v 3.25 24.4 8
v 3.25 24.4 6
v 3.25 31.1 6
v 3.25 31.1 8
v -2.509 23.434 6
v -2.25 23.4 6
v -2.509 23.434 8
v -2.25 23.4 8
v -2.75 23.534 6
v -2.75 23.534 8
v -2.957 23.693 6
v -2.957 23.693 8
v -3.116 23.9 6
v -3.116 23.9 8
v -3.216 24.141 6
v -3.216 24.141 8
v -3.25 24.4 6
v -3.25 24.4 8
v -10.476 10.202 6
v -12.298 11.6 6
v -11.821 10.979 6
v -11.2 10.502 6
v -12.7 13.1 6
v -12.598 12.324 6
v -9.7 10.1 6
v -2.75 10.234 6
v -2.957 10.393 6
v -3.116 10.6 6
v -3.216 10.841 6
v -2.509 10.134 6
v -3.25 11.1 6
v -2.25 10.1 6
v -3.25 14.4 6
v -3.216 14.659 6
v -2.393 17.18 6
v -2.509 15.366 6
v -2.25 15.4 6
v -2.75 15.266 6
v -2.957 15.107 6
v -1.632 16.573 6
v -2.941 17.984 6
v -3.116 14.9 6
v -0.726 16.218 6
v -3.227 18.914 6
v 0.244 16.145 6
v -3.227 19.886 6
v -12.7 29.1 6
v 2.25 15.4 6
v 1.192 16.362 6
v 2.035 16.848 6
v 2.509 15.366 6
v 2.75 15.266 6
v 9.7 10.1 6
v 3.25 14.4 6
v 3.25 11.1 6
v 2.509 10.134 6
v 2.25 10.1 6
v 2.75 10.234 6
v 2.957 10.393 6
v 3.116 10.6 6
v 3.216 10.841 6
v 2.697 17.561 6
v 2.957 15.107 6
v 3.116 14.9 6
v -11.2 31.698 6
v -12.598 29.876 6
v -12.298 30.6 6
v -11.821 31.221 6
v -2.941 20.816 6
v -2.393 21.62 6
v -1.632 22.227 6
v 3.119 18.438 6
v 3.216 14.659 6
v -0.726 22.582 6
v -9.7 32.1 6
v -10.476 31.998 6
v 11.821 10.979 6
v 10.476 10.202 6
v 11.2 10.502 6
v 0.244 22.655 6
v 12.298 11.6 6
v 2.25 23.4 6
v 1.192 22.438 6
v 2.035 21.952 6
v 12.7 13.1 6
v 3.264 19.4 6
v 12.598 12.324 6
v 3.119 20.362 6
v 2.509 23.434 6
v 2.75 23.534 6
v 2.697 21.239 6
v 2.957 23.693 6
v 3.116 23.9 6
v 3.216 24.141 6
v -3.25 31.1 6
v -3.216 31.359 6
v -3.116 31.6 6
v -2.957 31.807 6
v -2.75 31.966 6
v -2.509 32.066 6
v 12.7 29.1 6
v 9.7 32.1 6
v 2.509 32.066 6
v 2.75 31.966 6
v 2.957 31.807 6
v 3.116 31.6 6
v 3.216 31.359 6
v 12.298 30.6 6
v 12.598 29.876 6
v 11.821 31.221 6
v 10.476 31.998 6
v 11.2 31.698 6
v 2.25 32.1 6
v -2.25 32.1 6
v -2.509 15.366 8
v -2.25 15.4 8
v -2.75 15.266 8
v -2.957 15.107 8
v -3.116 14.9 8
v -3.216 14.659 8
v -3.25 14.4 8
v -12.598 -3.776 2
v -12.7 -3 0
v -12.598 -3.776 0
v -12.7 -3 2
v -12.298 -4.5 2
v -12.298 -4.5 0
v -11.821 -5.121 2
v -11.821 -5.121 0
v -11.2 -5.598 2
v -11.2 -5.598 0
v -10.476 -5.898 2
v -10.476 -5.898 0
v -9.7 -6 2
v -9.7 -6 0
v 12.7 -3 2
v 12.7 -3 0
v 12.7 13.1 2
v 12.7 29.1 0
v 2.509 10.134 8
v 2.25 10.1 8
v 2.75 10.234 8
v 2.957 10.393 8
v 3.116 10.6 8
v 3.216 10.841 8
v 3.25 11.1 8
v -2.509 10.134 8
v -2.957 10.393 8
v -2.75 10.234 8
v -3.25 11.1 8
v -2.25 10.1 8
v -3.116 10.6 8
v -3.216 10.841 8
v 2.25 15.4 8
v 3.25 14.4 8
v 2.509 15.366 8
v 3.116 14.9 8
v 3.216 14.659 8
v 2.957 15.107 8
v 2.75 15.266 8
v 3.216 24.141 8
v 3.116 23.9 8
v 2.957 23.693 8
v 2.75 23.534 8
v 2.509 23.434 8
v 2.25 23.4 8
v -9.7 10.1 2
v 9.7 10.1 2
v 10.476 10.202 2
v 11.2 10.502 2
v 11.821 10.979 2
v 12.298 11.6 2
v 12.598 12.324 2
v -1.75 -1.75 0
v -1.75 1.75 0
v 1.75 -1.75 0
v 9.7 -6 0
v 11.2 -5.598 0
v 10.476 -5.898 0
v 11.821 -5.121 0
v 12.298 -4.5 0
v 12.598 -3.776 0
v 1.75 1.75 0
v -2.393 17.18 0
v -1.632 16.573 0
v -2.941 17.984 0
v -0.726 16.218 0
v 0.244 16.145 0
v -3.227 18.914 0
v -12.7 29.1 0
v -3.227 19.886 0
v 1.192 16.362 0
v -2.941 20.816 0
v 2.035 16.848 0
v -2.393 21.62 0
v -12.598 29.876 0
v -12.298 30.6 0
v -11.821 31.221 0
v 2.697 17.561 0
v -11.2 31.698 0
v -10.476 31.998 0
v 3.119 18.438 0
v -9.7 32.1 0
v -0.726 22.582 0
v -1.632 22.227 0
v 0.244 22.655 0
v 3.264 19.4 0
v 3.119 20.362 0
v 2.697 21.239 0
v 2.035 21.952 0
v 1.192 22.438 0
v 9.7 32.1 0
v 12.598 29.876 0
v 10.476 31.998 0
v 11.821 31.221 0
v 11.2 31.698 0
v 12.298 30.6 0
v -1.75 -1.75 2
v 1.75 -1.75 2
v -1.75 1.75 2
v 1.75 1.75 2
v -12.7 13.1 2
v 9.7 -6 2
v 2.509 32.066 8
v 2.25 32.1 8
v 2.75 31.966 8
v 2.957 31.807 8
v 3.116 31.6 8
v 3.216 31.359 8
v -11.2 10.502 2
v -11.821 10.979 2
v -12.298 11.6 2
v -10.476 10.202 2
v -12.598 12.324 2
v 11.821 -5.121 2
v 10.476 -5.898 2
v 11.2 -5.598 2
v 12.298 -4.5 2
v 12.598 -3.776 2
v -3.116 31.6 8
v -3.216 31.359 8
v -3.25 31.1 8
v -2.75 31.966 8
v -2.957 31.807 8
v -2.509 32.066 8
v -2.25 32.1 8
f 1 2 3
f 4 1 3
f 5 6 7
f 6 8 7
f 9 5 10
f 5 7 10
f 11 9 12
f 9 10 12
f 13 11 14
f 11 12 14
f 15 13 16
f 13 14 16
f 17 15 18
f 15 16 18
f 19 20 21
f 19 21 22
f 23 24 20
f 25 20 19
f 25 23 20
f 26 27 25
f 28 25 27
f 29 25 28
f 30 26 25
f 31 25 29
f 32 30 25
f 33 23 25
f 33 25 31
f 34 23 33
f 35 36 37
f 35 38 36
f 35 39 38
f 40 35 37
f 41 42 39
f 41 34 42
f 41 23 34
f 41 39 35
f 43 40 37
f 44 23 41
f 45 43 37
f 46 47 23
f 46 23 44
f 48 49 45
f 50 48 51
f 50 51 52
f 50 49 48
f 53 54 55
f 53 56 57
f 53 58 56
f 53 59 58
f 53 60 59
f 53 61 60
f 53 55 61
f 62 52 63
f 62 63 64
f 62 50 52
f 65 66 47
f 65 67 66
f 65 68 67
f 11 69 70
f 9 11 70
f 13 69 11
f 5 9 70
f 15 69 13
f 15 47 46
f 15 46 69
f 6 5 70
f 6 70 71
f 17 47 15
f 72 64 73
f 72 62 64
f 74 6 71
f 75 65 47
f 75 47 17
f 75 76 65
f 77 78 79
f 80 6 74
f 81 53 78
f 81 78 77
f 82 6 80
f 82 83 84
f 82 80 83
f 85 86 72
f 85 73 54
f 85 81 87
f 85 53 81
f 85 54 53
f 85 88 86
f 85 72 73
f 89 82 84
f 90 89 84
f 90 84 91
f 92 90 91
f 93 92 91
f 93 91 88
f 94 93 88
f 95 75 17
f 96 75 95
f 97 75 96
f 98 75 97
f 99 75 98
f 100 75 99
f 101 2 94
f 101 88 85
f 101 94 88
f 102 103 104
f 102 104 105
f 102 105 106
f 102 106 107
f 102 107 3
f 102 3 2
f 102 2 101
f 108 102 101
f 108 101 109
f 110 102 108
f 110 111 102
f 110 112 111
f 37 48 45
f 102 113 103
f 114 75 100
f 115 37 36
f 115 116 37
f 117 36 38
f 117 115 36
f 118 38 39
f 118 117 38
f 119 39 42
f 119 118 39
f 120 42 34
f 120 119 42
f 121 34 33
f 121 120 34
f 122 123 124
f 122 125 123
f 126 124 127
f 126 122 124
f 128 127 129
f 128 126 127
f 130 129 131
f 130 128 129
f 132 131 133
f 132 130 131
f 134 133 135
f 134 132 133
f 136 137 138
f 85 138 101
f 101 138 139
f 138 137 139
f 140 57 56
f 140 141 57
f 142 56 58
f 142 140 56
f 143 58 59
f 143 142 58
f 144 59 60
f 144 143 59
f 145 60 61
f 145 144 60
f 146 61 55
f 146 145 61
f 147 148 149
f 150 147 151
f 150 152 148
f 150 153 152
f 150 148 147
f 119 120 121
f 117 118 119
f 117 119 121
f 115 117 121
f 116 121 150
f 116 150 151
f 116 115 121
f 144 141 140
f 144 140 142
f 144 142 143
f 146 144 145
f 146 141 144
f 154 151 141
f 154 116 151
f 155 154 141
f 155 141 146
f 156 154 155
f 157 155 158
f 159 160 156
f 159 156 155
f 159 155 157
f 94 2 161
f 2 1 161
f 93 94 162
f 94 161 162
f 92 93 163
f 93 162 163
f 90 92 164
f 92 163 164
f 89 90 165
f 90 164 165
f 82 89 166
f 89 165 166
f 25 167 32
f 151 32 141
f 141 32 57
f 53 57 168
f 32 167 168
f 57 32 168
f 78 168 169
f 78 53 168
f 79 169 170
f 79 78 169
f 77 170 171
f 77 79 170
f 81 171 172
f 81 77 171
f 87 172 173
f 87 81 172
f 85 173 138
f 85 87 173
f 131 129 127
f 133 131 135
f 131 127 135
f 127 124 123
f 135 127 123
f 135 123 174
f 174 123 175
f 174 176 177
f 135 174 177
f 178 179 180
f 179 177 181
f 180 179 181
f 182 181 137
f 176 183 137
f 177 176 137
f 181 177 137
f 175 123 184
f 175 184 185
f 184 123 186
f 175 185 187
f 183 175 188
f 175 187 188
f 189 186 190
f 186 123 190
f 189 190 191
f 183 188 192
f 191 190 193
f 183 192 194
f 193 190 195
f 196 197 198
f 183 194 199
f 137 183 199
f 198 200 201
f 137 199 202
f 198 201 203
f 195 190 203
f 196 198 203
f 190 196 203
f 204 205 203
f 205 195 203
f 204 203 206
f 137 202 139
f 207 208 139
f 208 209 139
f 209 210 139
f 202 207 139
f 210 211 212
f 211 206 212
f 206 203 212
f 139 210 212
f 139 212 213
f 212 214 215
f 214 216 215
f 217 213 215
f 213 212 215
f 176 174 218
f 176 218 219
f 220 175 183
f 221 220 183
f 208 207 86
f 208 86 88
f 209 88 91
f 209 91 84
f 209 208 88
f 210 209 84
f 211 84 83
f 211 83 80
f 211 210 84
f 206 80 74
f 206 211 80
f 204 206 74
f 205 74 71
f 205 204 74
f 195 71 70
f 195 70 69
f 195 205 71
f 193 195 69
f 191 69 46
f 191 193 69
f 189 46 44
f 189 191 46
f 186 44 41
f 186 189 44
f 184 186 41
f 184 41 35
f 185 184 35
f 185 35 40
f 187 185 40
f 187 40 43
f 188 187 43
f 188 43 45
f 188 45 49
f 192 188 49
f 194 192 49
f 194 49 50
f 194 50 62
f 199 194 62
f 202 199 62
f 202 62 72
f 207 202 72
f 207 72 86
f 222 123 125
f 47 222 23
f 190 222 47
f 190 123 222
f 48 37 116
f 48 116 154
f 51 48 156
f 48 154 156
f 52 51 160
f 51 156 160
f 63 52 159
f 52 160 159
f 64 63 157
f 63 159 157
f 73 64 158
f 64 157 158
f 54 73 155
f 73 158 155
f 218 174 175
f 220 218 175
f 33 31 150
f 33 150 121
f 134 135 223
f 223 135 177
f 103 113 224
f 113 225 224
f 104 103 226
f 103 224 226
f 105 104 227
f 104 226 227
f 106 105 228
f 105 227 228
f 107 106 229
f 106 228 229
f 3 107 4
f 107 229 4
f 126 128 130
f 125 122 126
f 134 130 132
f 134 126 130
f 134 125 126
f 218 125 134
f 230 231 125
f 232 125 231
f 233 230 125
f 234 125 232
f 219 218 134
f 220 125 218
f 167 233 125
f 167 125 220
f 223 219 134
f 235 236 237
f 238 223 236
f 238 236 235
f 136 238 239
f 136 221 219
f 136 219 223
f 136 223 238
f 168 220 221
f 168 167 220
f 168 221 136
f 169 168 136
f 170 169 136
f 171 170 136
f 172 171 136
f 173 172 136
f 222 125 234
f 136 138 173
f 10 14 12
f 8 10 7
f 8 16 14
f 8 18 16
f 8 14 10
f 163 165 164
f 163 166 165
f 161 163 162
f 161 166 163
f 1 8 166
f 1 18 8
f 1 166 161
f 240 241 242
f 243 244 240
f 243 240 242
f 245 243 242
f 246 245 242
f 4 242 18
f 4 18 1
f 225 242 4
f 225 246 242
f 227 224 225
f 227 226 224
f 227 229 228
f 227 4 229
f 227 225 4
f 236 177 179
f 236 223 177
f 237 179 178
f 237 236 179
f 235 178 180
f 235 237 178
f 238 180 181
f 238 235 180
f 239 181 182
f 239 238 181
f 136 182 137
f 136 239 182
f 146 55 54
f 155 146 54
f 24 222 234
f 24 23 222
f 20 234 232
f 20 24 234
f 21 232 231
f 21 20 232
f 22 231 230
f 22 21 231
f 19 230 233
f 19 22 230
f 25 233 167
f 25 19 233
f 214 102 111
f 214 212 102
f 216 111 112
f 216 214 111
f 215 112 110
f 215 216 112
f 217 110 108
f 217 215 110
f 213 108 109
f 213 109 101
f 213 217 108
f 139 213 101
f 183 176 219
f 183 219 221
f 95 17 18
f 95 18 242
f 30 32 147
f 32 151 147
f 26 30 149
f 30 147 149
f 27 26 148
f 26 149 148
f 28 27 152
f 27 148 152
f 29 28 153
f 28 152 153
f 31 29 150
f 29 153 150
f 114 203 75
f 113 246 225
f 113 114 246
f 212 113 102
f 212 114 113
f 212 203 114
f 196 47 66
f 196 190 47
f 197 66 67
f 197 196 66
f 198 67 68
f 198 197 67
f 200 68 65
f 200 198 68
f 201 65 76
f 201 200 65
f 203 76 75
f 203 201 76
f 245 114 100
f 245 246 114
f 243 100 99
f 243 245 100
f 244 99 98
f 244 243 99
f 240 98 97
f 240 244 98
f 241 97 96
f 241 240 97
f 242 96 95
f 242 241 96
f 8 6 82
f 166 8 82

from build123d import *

# Parameters (mm, degrees)
MAIN_FEATURES_SKETCH_W     = 25.4
MAIN_FEATURES_SKETCH_H     = 38.1
MAIN_FEATURES_SKETCH_R     = 3.2639
MAIN_FEATURES_SKETCH_W_2   = 3.5
MAIN_FEATURES_SKETCH_H_2   = 3.5
BASE_DEPTH                 = 2
SKETCH1_3_W                = 25.4
SKETCH1_3_H                = 22
SKETCH1_3_R                = 3.2639
STANDOFF_DEPTH             = 6
PEGS_START                 = 6
MAIN_FEATURES_SKETCH_4_W   = 6.5
MAIN_FEATURES_SKETCH_4_H   = 8.7
MAIN_FEATURES_SKETCH_4_H_2 = 5.3
PEGS_DEPTH                 = 2
FILLET1_R                  = 3
FILLET2_R                  = 1


with BuildPart() as part:
    # main_features_sketch → base (new body)
    with BuildSketch(Plane.XY):
        with Locations((0, 13.05)):
            Rectangle(MAIN_FEATURES_SKETCH_W, MAIN_FEATURES_SKETCH_H)
        with Locations((0, 19.4)):
            Circle(MAIN_FEATURES_SKETCH_R, mode=Mode.SUBTRACT)
        Rectangle(MAIN_FEATURES_SKETCH_W_2, MAIN_FEATURES_SKETCH_H_2, mode=Mode.SUBTRACT)
    extrude(amount=BASE_DEPTH)

    # Sketch1<3> → standoff (add)
    with BuildSketch(Plane.XY):
        with Locations((0, 21.1)):
            Rectangle(SKETCH1_3_W, SKETCH1_3_H)
        with Locations((0, 19.4)):
            Circle(SKETCH1_3_R, mode=Mode.SUBTRACT)
    extrude(amount=STANDOFF_DEPTH)

    # main_features_sketch<4> → pegs (add)
    with BuildSketch(Plane.XY.offset(PEGS_START)):
        with Locations((0, 27.75)):
            Rectangle(MAIN_FEATURES_SKETCH_4_W, MAIN_FEATURES_SKETCH_4_H)
        with Locations((0, 12.75)):
            Rectangle(MAIN_FEATURES_SKETCH_4_W, MAIN_FEATURES_SKETCH_4_H_2)
    extrude(amount=PEGS_DEPTH)

    # Fillet1
    fillet1_edges = [part.edges().sort_by_distance(p)[0] for p in [
        (12.7, -6, 1),
        (-12.7, -6, 1),
        (-12.7, 32.1, 3),
        (12.7, 32.1, 3),
        (12.7, 10.1, 4),
        (-12.7, 10.1, 4),
    ]]
    fillet(fillet1_edges, radius=FILLET1_R)

    # Fillet2
    fillet2_edges = [part.edges().sort_by_distance(p)[0] for p in [
        (3.25, 32.1, 7),
        (-3.25, 32.1, 7),
        (-3.25, 23.4, 7),
        (3.25, 23.4, 7),
        (-3.25, 15.4, 7),
        (-3.25, 10.1, 7),
        (3.25, 10.1, 7),
        (3.25, 15.4, 7),
    ]]
    fillet(fillet2_edges, radius=FILLET2_R)


solid = part.part
